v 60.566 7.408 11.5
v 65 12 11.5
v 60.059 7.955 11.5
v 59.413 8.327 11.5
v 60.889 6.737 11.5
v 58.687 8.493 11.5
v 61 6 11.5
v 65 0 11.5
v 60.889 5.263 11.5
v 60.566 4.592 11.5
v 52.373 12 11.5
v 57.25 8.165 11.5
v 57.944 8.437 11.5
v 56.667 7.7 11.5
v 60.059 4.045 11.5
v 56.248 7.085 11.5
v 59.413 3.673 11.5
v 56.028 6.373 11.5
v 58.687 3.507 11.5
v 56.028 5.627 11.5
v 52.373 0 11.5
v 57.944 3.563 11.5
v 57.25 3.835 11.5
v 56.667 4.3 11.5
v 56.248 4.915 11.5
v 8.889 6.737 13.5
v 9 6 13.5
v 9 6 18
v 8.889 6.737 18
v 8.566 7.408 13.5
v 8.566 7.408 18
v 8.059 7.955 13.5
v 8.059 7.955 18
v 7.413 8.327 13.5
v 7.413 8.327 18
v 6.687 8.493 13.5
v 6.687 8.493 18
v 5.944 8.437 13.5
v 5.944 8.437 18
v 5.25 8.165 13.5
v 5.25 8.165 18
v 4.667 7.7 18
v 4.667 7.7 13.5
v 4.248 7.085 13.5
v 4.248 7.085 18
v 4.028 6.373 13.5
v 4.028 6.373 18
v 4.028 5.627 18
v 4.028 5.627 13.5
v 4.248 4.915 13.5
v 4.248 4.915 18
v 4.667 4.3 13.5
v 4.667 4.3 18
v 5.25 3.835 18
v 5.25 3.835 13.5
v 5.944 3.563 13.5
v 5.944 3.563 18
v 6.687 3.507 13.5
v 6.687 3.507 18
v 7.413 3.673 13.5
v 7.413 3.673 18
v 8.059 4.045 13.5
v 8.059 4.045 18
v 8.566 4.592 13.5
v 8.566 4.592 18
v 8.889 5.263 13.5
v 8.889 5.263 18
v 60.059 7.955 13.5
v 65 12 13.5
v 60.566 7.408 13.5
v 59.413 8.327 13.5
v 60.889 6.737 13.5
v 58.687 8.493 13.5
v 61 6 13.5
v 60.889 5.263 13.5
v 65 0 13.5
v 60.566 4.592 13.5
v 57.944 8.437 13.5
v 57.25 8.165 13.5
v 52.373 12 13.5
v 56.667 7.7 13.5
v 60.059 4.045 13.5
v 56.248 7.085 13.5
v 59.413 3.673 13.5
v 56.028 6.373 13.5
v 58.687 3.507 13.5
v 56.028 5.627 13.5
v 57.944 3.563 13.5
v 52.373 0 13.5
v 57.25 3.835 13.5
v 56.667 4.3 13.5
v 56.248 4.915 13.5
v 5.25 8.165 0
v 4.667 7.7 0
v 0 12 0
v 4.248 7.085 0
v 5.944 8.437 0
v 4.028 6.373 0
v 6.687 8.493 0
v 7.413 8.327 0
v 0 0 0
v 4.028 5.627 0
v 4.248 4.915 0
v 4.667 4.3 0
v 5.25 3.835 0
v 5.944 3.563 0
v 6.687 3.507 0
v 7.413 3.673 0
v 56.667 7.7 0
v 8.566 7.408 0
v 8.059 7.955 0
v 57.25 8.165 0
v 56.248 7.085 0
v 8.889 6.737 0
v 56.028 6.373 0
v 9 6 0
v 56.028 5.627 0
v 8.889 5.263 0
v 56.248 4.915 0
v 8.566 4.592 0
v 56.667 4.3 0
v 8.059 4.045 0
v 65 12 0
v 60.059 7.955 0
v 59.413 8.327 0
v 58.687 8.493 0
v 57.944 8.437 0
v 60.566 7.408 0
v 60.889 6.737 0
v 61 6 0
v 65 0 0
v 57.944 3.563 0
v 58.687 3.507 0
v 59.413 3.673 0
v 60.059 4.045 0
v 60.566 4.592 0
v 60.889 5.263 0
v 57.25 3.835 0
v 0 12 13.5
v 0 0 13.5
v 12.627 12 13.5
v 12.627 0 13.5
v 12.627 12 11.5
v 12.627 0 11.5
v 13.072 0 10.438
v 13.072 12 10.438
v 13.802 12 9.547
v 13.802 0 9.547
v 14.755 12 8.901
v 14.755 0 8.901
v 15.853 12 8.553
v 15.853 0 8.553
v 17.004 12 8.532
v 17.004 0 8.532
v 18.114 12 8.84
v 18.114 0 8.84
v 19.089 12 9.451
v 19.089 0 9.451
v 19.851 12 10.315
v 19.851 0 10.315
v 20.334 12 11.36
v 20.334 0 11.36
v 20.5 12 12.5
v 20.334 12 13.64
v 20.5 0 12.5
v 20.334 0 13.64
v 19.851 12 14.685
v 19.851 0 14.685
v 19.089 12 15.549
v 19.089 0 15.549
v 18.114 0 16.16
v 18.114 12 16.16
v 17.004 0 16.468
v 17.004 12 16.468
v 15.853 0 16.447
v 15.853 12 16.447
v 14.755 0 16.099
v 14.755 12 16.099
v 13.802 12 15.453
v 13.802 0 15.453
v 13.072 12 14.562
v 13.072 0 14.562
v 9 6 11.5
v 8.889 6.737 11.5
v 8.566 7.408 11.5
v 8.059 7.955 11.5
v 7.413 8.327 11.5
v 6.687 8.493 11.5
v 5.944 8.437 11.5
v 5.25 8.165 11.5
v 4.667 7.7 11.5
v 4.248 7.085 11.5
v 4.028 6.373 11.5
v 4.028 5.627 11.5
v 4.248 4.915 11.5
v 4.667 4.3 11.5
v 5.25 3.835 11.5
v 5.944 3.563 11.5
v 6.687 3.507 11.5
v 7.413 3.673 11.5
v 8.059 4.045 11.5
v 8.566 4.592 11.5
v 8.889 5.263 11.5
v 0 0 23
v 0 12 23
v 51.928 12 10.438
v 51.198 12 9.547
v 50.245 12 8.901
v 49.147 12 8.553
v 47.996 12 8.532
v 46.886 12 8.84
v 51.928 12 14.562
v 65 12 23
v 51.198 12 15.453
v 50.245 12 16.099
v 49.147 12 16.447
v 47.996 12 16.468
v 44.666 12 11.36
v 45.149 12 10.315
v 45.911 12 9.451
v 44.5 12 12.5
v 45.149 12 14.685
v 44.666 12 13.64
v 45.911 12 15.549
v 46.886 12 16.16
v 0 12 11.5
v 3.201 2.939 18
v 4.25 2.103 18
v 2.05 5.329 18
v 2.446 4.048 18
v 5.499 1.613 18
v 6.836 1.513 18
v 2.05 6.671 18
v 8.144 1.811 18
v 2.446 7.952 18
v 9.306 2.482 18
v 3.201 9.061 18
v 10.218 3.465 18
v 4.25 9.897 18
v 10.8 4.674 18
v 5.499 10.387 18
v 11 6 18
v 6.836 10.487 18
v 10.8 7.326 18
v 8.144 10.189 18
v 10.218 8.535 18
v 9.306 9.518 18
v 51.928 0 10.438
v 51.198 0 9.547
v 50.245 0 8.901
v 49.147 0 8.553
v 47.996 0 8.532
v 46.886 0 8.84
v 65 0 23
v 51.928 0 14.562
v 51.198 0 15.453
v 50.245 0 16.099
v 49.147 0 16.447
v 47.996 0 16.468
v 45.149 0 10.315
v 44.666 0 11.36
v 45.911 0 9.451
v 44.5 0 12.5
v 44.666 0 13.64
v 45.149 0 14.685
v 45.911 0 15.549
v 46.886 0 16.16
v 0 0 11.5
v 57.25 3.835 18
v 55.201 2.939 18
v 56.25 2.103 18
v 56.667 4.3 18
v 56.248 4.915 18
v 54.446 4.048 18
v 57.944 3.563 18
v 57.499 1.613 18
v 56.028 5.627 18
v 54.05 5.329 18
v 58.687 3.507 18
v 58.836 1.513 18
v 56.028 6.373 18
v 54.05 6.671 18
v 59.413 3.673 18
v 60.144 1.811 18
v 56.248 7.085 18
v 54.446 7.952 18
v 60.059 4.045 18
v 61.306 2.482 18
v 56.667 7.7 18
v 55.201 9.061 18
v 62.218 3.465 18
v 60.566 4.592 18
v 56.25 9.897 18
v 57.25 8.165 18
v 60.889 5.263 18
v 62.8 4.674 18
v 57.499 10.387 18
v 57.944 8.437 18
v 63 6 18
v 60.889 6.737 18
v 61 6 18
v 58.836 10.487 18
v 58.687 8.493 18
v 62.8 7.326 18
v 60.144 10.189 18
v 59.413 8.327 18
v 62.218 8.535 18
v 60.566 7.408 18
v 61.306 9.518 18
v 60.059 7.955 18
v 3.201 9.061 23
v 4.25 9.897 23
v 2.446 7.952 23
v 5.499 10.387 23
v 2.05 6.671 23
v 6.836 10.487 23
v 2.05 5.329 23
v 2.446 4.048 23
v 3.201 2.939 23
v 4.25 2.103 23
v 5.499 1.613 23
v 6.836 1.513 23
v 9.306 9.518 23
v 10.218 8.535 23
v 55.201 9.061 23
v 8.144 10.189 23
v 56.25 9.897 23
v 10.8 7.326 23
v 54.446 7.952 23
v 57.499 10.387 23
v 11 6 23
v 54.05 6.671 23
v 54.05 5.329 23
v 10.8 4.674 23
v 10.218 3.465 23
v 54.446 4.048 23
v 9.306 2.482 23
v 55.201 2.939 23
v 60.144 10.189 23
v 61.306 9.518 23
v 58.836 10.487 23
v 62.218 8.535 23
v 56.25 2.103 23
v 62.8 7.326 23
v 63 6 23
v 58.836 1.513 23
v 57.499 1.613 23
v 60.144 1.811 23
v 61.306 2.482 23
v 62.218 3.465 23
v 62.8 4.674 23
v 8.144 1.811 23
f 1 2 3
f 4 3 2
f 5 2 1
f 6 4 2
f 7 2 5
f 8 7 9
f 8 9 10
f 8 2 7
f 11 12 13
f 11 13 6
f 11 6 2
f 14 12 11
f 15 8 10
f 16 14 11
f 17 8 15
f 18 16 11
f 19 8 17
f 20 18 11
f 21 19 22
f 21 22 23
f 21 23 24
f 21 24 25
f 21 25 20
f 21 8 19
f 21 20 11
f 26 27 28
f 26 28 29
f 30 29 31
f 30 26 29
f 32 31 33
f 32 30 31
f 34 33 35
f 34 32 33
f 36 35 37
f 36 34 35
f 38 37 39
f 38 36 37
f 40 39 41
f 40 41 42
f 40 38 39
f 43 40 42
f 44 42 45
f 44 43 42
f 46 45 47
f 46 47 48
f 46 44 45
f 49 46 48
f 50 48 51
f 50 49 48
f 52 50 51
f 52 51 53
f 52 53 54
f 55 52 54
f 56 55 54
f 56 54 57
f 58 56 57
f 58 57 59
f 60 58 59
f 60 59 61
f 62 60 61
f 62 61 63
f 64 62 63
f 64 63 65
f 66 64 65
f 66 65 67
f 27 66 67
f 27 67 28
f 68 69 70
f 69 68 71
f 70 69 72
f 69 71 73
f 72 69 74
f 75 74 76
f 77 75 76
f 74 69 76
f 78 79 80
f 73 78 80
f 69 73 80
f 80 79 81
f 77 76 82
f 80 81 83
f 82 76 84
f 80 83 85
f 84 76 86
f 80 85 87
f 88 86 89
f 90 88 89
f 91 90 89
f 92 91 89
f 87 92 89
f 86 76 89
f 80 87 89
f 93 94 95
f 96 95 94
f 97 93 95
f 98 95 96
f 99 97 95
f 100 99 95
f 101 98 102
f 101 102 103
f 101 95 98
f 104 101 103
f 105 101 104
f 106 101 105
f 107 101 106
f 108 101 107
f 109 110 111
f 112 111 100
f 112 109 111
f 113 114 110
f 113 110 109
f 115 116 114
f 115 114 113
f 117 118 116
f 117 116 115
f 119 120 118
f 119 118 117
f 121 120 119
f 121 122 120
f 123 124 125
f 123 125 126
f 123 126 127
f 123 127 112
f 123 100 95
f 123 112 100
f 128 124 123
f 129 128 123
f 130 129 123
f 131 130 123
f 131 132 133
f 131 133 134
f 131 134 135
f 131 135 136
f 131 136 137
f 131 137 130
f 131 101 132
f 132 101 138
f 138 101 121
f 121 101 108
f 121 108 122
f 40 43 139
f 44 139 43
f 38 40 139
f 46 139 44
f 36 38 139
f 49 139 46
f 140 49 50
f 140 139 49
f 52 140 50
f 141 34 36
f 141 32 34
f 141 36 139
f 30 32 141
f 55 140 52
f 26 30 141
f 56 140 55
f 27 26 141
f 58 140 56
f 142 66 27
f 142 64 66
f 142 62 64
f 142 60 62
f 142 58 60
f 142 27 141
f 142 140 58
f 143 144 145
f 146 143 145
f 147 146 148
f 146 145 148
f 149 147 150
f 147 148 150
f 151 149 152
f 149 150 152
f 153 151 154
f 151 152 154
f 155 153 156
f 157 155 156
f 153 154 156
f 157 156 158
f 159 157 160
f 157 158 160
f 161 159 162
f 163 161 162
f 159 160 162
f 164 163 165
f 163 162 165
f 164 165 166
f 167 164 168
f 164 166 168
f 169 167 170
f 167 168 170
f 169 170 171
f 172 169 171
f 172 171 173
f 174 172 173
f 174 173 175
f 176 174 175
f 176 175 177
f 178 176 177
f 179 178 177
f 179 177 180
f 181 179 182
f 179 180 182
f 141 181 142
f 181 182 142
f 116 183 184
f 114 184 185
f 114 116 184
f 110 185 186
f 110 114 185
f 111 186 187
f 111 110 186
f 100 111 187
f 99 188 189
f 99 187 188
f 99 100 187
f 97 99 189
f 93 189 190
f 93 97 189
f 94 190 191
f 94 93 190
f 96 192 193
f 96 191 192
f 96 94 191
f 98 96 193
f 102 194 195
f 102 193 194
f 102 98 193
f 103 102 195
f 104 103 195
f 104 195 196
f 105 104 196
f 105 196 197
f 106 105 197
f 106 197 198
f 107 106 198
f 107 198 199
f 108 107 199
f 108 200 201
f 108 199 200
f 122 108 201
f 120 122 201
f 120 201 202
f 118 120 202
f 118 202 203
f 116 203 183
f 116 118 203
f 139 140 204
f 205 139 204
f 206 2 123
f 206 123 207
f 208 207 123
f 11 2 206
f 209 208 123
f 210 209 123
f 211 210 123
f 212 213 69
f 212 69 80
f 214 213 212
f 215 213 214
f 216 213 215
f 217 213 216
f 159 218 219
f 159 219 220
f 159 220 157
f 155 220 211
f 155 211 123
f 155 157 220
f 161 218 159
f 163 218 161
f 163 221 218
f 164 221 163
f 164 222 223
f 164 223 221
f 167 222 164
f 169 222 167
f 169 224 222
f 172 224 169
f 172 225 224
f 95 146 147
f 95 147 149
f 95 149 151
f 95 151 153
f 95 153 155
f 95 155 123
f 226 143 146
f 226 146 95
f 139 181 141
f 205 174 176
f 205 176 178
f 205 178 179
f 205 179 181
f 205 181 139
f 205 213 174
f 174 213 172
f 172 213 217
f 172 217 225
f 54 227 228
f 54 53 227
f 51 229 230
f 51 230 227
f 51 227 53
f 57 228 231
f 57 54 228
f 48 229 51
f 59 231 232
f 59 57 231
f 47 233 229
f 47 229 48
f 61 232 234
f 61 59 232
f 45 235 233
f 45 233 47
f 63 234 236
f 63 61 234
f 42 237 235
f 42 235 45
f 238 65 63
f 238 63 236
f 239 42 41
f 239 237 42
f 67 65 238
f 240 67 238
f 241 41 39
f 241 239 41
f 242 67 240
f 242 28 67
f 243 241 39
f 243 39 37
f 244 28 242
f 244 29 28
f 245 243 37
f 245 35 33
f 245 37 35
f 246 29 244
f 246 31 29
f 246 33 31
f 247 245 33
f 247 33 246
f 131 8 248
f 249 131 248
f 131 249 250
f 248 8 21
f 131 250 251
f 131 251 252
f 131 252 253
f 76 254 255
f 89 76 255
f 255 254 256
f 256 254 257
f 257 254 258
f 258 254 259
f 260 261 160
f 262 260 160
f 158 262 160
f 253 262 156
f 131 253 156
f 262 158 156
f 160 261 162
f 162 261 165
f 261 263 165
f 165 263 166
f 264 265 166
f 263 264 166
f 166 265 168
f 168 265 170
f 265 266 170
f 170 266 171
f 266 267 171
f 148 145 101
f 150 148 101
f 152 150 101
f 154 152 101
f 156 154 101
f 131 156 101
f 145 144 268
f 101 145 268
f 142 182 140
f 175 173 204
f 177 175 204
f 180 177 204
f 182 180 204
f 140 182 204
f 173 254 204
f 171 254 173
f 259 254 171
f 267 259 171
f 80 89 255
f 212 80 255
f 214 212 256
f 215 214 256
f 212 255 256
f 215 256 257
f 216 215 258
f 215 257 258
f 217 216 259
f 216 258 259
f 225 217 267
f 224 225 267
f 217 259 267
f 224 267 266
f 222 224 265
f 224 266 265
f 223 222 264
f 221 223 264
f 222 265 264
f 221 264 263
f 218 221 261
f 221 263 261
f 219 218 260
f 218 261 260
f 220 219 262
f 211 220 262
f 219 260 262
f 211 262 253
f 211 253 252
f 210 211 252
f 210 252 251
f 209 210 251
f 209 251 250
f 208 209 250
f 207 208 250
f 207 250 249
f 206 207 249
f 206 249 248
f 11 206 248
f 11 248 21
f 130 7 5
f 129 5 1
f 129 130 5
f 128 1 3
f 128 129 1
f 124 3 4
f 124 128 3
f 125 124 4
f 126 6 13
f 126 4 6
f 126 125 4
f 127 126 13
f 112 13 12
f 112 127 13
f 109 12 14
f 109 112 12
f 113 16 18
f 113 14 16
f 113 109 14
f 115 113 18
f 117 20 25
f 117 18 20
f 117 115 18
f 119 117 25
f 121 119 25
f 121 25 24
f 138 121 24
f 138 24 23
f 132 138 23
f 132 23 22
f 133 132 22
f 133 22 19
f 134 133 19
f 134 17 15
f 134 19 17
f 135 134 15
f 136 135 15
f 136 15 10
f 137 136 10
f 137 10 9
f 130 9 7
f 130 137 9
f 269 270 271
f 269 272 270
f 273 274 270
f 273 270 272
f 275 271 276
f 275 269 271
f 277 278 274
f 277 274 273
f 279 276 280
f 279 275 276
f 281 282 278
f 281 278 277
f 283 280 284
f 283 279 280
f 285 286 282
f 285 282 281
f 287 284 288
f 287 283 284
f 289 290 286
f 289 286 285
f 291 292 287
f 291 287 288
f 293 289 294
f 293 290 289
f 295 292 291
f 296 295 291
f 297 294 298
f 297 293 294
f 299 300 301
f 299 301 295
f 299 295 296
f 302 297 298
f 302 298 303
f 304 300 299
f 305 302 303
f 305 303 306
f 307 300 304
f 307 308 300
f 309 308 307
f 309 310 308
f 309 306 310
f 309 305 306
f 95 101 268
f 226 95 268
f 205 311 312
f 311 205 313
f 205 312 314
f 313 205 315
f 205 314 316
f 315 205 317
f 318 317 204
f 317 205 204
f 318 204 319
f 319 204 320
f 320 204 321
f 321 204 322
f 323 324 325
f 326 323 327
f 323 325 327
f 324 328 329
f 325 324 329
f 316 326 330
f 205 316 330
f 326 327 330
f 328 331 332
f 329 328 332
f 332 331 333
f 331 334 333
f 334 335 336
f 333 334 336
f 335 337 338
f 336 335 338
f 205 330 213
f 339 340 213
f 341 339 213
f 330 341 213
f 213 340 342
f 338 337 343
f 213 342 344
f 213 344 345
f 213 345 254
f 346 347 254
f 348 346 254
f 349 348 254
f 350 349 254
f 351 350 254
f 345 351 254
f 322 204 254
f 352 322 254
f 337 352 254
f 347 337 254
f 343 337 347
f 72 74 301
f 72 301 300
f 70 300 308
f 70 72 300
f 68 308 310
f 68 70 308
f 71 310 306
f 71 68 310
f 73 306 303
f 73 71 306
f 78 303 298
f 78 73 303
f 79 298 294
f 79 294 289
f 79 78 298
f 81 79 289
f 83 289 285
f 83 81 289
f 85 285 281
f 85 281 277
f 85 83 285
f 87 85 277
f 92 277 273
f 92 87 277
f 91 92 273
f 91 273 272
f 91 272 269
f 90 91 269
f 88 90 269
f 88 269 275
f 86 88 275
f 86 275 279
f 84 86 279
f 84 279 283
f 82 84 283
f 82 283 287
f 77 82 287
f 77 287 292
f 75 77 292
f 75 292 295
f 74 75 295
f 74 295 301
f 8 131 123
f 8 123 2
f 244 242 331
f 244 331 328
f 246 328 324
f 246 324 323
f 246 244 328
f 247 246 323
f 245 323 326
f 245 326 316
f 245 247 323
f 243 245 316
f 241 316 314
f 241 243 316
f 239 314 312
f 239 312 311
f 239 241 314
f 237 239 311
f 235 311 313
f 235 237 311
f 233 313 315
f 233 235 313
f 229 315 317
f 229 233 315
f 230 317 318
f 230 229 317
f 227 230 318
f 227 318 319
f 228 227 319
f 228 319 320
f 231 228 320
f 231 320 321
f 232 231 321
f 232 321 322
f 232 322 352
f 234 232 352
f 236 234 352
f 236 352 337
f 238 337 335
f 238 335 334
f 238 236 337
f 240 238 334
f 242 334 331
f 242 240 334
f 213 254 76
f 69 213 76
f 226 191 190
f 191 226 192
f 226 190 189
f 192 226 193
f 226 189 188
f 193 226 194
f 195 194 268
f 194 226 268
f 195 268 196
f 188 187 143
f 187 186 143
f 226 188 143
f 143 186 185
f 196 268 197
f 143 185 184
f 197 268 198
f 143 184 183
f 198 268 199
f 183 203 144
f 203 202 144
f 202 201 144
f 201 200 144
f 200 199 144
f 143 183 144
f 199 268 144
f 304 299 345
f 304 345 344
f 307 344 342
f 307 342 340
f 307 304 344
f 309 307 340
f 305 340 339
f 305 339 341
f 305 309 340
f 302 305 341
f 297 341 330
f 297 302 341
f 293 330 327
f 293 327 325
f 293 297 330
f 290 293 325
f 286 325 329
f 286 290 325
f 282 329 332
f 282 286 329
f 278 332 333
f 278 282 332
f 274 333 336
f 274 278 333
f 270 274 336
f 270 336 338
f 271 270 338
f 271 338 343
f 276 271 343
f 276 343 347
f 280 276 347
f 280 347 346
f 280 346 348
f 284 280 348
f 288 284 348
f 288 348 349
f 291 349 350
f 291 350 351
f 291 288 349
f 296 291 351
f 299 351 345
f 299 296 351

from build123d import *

# Parameters (mm, degrees)
CYLINDER002_R     = 2.5
CYLINDER002_DEPTH = 18
CYLINDER003_R     = 4.5
CYLINDER003_DEPTH = 5
CYLINDER_R        = 2.5
CYLINDER_DEPTH    = 18
CYLINDER001_R     = 4.5
CYLINDER001_DEPTH = 5
PAD_DEPTH         = 12


with BuildPart() as cilindro002:
    # Cylinder002 → Cylinder002 (new body)
    with BuildSketch(Plane.XY):
        Circle(CYLINDER002_R)
    extrude(amount=CYLINDER002_DEPTH)


with BuildPart() as tornillo_dcho:
    # Cylinder003 → Cylinder003 (new body)
    with BuildSketch(Plane.XY.offset(18)):
        Circle(CYLINDER003_R)
    extrude(amount=CYLINDER003_DEPTH)

    # Fusion001: union Cilindro002
    add(cilindro002.part)


with BuildPart() as tornillo_dcho_1:
    # Fusion001 placement: moved
    add(tornillo_dcho.part.moved(Location((58.5, 6, 0))))


with BuildPart() as cilindro:
    # Cylinder → Cylinder (new body)
    with BuildSketch(Plane.XY):
        Circle(CYLINDER_R)
    extrude(amount=CYLINDER_DEPTH)


with BuildPart() as tornillos:
    # Cylinder001 → Cylinder001 (new body)
    with BuildSketch(Plane.XY.offset(18)):
        Circle(CYLINDER001_R)
    extrude(amount=CYLINDER001_DEPTH)

    # Fusion: union Cilindro
    add(cilindro.part)


with BuildPart() as tornillos_1:
    # Fusion placement: moved
    add(tornillos.part.moved(Location((6.5, 6, 0))))

    # Fusion002: union Tornillo Dcho
    add(tornillo_dcho_1.part)


with BuildPart() as kta08_m5:
    # Sketch → Pad (new body)
    with BuildSketch(Plane.XZ):
        with BuildLine():
            Line((0, 0), (0, 11.5))
            Line((0, 11.5), (12.627017, 11.5))
            ThreePointArc((12.627017, 11.5), (20.5, 12.5), (12.627017, 13.5))
            Line((0, 13.5), (12.627017, 13.5))
            Line((0, 13.5), (0, 23))
            Line((0, 23), (65, 23))
            Line((65, 23), (65, 13.5))
            Line((65, 13.5), (52.372983, 13.5))
            ThreePointArc((52.372983, 13.5), (44.5, 12.5), (52.372983, 11.5))
            Line((65, 11.5), (52.372983, 11.5))
            Line((65, 0), (65, 11.5))
            Line((0, 0), (65, 0))
        make_face()
    extrude(amount=-PAD_DEPTH)

    # Cut: cut Tornillos
    add(tornillos_1.part, mode=Mode.SUBTRACT)


solid = kta08_m5.part
